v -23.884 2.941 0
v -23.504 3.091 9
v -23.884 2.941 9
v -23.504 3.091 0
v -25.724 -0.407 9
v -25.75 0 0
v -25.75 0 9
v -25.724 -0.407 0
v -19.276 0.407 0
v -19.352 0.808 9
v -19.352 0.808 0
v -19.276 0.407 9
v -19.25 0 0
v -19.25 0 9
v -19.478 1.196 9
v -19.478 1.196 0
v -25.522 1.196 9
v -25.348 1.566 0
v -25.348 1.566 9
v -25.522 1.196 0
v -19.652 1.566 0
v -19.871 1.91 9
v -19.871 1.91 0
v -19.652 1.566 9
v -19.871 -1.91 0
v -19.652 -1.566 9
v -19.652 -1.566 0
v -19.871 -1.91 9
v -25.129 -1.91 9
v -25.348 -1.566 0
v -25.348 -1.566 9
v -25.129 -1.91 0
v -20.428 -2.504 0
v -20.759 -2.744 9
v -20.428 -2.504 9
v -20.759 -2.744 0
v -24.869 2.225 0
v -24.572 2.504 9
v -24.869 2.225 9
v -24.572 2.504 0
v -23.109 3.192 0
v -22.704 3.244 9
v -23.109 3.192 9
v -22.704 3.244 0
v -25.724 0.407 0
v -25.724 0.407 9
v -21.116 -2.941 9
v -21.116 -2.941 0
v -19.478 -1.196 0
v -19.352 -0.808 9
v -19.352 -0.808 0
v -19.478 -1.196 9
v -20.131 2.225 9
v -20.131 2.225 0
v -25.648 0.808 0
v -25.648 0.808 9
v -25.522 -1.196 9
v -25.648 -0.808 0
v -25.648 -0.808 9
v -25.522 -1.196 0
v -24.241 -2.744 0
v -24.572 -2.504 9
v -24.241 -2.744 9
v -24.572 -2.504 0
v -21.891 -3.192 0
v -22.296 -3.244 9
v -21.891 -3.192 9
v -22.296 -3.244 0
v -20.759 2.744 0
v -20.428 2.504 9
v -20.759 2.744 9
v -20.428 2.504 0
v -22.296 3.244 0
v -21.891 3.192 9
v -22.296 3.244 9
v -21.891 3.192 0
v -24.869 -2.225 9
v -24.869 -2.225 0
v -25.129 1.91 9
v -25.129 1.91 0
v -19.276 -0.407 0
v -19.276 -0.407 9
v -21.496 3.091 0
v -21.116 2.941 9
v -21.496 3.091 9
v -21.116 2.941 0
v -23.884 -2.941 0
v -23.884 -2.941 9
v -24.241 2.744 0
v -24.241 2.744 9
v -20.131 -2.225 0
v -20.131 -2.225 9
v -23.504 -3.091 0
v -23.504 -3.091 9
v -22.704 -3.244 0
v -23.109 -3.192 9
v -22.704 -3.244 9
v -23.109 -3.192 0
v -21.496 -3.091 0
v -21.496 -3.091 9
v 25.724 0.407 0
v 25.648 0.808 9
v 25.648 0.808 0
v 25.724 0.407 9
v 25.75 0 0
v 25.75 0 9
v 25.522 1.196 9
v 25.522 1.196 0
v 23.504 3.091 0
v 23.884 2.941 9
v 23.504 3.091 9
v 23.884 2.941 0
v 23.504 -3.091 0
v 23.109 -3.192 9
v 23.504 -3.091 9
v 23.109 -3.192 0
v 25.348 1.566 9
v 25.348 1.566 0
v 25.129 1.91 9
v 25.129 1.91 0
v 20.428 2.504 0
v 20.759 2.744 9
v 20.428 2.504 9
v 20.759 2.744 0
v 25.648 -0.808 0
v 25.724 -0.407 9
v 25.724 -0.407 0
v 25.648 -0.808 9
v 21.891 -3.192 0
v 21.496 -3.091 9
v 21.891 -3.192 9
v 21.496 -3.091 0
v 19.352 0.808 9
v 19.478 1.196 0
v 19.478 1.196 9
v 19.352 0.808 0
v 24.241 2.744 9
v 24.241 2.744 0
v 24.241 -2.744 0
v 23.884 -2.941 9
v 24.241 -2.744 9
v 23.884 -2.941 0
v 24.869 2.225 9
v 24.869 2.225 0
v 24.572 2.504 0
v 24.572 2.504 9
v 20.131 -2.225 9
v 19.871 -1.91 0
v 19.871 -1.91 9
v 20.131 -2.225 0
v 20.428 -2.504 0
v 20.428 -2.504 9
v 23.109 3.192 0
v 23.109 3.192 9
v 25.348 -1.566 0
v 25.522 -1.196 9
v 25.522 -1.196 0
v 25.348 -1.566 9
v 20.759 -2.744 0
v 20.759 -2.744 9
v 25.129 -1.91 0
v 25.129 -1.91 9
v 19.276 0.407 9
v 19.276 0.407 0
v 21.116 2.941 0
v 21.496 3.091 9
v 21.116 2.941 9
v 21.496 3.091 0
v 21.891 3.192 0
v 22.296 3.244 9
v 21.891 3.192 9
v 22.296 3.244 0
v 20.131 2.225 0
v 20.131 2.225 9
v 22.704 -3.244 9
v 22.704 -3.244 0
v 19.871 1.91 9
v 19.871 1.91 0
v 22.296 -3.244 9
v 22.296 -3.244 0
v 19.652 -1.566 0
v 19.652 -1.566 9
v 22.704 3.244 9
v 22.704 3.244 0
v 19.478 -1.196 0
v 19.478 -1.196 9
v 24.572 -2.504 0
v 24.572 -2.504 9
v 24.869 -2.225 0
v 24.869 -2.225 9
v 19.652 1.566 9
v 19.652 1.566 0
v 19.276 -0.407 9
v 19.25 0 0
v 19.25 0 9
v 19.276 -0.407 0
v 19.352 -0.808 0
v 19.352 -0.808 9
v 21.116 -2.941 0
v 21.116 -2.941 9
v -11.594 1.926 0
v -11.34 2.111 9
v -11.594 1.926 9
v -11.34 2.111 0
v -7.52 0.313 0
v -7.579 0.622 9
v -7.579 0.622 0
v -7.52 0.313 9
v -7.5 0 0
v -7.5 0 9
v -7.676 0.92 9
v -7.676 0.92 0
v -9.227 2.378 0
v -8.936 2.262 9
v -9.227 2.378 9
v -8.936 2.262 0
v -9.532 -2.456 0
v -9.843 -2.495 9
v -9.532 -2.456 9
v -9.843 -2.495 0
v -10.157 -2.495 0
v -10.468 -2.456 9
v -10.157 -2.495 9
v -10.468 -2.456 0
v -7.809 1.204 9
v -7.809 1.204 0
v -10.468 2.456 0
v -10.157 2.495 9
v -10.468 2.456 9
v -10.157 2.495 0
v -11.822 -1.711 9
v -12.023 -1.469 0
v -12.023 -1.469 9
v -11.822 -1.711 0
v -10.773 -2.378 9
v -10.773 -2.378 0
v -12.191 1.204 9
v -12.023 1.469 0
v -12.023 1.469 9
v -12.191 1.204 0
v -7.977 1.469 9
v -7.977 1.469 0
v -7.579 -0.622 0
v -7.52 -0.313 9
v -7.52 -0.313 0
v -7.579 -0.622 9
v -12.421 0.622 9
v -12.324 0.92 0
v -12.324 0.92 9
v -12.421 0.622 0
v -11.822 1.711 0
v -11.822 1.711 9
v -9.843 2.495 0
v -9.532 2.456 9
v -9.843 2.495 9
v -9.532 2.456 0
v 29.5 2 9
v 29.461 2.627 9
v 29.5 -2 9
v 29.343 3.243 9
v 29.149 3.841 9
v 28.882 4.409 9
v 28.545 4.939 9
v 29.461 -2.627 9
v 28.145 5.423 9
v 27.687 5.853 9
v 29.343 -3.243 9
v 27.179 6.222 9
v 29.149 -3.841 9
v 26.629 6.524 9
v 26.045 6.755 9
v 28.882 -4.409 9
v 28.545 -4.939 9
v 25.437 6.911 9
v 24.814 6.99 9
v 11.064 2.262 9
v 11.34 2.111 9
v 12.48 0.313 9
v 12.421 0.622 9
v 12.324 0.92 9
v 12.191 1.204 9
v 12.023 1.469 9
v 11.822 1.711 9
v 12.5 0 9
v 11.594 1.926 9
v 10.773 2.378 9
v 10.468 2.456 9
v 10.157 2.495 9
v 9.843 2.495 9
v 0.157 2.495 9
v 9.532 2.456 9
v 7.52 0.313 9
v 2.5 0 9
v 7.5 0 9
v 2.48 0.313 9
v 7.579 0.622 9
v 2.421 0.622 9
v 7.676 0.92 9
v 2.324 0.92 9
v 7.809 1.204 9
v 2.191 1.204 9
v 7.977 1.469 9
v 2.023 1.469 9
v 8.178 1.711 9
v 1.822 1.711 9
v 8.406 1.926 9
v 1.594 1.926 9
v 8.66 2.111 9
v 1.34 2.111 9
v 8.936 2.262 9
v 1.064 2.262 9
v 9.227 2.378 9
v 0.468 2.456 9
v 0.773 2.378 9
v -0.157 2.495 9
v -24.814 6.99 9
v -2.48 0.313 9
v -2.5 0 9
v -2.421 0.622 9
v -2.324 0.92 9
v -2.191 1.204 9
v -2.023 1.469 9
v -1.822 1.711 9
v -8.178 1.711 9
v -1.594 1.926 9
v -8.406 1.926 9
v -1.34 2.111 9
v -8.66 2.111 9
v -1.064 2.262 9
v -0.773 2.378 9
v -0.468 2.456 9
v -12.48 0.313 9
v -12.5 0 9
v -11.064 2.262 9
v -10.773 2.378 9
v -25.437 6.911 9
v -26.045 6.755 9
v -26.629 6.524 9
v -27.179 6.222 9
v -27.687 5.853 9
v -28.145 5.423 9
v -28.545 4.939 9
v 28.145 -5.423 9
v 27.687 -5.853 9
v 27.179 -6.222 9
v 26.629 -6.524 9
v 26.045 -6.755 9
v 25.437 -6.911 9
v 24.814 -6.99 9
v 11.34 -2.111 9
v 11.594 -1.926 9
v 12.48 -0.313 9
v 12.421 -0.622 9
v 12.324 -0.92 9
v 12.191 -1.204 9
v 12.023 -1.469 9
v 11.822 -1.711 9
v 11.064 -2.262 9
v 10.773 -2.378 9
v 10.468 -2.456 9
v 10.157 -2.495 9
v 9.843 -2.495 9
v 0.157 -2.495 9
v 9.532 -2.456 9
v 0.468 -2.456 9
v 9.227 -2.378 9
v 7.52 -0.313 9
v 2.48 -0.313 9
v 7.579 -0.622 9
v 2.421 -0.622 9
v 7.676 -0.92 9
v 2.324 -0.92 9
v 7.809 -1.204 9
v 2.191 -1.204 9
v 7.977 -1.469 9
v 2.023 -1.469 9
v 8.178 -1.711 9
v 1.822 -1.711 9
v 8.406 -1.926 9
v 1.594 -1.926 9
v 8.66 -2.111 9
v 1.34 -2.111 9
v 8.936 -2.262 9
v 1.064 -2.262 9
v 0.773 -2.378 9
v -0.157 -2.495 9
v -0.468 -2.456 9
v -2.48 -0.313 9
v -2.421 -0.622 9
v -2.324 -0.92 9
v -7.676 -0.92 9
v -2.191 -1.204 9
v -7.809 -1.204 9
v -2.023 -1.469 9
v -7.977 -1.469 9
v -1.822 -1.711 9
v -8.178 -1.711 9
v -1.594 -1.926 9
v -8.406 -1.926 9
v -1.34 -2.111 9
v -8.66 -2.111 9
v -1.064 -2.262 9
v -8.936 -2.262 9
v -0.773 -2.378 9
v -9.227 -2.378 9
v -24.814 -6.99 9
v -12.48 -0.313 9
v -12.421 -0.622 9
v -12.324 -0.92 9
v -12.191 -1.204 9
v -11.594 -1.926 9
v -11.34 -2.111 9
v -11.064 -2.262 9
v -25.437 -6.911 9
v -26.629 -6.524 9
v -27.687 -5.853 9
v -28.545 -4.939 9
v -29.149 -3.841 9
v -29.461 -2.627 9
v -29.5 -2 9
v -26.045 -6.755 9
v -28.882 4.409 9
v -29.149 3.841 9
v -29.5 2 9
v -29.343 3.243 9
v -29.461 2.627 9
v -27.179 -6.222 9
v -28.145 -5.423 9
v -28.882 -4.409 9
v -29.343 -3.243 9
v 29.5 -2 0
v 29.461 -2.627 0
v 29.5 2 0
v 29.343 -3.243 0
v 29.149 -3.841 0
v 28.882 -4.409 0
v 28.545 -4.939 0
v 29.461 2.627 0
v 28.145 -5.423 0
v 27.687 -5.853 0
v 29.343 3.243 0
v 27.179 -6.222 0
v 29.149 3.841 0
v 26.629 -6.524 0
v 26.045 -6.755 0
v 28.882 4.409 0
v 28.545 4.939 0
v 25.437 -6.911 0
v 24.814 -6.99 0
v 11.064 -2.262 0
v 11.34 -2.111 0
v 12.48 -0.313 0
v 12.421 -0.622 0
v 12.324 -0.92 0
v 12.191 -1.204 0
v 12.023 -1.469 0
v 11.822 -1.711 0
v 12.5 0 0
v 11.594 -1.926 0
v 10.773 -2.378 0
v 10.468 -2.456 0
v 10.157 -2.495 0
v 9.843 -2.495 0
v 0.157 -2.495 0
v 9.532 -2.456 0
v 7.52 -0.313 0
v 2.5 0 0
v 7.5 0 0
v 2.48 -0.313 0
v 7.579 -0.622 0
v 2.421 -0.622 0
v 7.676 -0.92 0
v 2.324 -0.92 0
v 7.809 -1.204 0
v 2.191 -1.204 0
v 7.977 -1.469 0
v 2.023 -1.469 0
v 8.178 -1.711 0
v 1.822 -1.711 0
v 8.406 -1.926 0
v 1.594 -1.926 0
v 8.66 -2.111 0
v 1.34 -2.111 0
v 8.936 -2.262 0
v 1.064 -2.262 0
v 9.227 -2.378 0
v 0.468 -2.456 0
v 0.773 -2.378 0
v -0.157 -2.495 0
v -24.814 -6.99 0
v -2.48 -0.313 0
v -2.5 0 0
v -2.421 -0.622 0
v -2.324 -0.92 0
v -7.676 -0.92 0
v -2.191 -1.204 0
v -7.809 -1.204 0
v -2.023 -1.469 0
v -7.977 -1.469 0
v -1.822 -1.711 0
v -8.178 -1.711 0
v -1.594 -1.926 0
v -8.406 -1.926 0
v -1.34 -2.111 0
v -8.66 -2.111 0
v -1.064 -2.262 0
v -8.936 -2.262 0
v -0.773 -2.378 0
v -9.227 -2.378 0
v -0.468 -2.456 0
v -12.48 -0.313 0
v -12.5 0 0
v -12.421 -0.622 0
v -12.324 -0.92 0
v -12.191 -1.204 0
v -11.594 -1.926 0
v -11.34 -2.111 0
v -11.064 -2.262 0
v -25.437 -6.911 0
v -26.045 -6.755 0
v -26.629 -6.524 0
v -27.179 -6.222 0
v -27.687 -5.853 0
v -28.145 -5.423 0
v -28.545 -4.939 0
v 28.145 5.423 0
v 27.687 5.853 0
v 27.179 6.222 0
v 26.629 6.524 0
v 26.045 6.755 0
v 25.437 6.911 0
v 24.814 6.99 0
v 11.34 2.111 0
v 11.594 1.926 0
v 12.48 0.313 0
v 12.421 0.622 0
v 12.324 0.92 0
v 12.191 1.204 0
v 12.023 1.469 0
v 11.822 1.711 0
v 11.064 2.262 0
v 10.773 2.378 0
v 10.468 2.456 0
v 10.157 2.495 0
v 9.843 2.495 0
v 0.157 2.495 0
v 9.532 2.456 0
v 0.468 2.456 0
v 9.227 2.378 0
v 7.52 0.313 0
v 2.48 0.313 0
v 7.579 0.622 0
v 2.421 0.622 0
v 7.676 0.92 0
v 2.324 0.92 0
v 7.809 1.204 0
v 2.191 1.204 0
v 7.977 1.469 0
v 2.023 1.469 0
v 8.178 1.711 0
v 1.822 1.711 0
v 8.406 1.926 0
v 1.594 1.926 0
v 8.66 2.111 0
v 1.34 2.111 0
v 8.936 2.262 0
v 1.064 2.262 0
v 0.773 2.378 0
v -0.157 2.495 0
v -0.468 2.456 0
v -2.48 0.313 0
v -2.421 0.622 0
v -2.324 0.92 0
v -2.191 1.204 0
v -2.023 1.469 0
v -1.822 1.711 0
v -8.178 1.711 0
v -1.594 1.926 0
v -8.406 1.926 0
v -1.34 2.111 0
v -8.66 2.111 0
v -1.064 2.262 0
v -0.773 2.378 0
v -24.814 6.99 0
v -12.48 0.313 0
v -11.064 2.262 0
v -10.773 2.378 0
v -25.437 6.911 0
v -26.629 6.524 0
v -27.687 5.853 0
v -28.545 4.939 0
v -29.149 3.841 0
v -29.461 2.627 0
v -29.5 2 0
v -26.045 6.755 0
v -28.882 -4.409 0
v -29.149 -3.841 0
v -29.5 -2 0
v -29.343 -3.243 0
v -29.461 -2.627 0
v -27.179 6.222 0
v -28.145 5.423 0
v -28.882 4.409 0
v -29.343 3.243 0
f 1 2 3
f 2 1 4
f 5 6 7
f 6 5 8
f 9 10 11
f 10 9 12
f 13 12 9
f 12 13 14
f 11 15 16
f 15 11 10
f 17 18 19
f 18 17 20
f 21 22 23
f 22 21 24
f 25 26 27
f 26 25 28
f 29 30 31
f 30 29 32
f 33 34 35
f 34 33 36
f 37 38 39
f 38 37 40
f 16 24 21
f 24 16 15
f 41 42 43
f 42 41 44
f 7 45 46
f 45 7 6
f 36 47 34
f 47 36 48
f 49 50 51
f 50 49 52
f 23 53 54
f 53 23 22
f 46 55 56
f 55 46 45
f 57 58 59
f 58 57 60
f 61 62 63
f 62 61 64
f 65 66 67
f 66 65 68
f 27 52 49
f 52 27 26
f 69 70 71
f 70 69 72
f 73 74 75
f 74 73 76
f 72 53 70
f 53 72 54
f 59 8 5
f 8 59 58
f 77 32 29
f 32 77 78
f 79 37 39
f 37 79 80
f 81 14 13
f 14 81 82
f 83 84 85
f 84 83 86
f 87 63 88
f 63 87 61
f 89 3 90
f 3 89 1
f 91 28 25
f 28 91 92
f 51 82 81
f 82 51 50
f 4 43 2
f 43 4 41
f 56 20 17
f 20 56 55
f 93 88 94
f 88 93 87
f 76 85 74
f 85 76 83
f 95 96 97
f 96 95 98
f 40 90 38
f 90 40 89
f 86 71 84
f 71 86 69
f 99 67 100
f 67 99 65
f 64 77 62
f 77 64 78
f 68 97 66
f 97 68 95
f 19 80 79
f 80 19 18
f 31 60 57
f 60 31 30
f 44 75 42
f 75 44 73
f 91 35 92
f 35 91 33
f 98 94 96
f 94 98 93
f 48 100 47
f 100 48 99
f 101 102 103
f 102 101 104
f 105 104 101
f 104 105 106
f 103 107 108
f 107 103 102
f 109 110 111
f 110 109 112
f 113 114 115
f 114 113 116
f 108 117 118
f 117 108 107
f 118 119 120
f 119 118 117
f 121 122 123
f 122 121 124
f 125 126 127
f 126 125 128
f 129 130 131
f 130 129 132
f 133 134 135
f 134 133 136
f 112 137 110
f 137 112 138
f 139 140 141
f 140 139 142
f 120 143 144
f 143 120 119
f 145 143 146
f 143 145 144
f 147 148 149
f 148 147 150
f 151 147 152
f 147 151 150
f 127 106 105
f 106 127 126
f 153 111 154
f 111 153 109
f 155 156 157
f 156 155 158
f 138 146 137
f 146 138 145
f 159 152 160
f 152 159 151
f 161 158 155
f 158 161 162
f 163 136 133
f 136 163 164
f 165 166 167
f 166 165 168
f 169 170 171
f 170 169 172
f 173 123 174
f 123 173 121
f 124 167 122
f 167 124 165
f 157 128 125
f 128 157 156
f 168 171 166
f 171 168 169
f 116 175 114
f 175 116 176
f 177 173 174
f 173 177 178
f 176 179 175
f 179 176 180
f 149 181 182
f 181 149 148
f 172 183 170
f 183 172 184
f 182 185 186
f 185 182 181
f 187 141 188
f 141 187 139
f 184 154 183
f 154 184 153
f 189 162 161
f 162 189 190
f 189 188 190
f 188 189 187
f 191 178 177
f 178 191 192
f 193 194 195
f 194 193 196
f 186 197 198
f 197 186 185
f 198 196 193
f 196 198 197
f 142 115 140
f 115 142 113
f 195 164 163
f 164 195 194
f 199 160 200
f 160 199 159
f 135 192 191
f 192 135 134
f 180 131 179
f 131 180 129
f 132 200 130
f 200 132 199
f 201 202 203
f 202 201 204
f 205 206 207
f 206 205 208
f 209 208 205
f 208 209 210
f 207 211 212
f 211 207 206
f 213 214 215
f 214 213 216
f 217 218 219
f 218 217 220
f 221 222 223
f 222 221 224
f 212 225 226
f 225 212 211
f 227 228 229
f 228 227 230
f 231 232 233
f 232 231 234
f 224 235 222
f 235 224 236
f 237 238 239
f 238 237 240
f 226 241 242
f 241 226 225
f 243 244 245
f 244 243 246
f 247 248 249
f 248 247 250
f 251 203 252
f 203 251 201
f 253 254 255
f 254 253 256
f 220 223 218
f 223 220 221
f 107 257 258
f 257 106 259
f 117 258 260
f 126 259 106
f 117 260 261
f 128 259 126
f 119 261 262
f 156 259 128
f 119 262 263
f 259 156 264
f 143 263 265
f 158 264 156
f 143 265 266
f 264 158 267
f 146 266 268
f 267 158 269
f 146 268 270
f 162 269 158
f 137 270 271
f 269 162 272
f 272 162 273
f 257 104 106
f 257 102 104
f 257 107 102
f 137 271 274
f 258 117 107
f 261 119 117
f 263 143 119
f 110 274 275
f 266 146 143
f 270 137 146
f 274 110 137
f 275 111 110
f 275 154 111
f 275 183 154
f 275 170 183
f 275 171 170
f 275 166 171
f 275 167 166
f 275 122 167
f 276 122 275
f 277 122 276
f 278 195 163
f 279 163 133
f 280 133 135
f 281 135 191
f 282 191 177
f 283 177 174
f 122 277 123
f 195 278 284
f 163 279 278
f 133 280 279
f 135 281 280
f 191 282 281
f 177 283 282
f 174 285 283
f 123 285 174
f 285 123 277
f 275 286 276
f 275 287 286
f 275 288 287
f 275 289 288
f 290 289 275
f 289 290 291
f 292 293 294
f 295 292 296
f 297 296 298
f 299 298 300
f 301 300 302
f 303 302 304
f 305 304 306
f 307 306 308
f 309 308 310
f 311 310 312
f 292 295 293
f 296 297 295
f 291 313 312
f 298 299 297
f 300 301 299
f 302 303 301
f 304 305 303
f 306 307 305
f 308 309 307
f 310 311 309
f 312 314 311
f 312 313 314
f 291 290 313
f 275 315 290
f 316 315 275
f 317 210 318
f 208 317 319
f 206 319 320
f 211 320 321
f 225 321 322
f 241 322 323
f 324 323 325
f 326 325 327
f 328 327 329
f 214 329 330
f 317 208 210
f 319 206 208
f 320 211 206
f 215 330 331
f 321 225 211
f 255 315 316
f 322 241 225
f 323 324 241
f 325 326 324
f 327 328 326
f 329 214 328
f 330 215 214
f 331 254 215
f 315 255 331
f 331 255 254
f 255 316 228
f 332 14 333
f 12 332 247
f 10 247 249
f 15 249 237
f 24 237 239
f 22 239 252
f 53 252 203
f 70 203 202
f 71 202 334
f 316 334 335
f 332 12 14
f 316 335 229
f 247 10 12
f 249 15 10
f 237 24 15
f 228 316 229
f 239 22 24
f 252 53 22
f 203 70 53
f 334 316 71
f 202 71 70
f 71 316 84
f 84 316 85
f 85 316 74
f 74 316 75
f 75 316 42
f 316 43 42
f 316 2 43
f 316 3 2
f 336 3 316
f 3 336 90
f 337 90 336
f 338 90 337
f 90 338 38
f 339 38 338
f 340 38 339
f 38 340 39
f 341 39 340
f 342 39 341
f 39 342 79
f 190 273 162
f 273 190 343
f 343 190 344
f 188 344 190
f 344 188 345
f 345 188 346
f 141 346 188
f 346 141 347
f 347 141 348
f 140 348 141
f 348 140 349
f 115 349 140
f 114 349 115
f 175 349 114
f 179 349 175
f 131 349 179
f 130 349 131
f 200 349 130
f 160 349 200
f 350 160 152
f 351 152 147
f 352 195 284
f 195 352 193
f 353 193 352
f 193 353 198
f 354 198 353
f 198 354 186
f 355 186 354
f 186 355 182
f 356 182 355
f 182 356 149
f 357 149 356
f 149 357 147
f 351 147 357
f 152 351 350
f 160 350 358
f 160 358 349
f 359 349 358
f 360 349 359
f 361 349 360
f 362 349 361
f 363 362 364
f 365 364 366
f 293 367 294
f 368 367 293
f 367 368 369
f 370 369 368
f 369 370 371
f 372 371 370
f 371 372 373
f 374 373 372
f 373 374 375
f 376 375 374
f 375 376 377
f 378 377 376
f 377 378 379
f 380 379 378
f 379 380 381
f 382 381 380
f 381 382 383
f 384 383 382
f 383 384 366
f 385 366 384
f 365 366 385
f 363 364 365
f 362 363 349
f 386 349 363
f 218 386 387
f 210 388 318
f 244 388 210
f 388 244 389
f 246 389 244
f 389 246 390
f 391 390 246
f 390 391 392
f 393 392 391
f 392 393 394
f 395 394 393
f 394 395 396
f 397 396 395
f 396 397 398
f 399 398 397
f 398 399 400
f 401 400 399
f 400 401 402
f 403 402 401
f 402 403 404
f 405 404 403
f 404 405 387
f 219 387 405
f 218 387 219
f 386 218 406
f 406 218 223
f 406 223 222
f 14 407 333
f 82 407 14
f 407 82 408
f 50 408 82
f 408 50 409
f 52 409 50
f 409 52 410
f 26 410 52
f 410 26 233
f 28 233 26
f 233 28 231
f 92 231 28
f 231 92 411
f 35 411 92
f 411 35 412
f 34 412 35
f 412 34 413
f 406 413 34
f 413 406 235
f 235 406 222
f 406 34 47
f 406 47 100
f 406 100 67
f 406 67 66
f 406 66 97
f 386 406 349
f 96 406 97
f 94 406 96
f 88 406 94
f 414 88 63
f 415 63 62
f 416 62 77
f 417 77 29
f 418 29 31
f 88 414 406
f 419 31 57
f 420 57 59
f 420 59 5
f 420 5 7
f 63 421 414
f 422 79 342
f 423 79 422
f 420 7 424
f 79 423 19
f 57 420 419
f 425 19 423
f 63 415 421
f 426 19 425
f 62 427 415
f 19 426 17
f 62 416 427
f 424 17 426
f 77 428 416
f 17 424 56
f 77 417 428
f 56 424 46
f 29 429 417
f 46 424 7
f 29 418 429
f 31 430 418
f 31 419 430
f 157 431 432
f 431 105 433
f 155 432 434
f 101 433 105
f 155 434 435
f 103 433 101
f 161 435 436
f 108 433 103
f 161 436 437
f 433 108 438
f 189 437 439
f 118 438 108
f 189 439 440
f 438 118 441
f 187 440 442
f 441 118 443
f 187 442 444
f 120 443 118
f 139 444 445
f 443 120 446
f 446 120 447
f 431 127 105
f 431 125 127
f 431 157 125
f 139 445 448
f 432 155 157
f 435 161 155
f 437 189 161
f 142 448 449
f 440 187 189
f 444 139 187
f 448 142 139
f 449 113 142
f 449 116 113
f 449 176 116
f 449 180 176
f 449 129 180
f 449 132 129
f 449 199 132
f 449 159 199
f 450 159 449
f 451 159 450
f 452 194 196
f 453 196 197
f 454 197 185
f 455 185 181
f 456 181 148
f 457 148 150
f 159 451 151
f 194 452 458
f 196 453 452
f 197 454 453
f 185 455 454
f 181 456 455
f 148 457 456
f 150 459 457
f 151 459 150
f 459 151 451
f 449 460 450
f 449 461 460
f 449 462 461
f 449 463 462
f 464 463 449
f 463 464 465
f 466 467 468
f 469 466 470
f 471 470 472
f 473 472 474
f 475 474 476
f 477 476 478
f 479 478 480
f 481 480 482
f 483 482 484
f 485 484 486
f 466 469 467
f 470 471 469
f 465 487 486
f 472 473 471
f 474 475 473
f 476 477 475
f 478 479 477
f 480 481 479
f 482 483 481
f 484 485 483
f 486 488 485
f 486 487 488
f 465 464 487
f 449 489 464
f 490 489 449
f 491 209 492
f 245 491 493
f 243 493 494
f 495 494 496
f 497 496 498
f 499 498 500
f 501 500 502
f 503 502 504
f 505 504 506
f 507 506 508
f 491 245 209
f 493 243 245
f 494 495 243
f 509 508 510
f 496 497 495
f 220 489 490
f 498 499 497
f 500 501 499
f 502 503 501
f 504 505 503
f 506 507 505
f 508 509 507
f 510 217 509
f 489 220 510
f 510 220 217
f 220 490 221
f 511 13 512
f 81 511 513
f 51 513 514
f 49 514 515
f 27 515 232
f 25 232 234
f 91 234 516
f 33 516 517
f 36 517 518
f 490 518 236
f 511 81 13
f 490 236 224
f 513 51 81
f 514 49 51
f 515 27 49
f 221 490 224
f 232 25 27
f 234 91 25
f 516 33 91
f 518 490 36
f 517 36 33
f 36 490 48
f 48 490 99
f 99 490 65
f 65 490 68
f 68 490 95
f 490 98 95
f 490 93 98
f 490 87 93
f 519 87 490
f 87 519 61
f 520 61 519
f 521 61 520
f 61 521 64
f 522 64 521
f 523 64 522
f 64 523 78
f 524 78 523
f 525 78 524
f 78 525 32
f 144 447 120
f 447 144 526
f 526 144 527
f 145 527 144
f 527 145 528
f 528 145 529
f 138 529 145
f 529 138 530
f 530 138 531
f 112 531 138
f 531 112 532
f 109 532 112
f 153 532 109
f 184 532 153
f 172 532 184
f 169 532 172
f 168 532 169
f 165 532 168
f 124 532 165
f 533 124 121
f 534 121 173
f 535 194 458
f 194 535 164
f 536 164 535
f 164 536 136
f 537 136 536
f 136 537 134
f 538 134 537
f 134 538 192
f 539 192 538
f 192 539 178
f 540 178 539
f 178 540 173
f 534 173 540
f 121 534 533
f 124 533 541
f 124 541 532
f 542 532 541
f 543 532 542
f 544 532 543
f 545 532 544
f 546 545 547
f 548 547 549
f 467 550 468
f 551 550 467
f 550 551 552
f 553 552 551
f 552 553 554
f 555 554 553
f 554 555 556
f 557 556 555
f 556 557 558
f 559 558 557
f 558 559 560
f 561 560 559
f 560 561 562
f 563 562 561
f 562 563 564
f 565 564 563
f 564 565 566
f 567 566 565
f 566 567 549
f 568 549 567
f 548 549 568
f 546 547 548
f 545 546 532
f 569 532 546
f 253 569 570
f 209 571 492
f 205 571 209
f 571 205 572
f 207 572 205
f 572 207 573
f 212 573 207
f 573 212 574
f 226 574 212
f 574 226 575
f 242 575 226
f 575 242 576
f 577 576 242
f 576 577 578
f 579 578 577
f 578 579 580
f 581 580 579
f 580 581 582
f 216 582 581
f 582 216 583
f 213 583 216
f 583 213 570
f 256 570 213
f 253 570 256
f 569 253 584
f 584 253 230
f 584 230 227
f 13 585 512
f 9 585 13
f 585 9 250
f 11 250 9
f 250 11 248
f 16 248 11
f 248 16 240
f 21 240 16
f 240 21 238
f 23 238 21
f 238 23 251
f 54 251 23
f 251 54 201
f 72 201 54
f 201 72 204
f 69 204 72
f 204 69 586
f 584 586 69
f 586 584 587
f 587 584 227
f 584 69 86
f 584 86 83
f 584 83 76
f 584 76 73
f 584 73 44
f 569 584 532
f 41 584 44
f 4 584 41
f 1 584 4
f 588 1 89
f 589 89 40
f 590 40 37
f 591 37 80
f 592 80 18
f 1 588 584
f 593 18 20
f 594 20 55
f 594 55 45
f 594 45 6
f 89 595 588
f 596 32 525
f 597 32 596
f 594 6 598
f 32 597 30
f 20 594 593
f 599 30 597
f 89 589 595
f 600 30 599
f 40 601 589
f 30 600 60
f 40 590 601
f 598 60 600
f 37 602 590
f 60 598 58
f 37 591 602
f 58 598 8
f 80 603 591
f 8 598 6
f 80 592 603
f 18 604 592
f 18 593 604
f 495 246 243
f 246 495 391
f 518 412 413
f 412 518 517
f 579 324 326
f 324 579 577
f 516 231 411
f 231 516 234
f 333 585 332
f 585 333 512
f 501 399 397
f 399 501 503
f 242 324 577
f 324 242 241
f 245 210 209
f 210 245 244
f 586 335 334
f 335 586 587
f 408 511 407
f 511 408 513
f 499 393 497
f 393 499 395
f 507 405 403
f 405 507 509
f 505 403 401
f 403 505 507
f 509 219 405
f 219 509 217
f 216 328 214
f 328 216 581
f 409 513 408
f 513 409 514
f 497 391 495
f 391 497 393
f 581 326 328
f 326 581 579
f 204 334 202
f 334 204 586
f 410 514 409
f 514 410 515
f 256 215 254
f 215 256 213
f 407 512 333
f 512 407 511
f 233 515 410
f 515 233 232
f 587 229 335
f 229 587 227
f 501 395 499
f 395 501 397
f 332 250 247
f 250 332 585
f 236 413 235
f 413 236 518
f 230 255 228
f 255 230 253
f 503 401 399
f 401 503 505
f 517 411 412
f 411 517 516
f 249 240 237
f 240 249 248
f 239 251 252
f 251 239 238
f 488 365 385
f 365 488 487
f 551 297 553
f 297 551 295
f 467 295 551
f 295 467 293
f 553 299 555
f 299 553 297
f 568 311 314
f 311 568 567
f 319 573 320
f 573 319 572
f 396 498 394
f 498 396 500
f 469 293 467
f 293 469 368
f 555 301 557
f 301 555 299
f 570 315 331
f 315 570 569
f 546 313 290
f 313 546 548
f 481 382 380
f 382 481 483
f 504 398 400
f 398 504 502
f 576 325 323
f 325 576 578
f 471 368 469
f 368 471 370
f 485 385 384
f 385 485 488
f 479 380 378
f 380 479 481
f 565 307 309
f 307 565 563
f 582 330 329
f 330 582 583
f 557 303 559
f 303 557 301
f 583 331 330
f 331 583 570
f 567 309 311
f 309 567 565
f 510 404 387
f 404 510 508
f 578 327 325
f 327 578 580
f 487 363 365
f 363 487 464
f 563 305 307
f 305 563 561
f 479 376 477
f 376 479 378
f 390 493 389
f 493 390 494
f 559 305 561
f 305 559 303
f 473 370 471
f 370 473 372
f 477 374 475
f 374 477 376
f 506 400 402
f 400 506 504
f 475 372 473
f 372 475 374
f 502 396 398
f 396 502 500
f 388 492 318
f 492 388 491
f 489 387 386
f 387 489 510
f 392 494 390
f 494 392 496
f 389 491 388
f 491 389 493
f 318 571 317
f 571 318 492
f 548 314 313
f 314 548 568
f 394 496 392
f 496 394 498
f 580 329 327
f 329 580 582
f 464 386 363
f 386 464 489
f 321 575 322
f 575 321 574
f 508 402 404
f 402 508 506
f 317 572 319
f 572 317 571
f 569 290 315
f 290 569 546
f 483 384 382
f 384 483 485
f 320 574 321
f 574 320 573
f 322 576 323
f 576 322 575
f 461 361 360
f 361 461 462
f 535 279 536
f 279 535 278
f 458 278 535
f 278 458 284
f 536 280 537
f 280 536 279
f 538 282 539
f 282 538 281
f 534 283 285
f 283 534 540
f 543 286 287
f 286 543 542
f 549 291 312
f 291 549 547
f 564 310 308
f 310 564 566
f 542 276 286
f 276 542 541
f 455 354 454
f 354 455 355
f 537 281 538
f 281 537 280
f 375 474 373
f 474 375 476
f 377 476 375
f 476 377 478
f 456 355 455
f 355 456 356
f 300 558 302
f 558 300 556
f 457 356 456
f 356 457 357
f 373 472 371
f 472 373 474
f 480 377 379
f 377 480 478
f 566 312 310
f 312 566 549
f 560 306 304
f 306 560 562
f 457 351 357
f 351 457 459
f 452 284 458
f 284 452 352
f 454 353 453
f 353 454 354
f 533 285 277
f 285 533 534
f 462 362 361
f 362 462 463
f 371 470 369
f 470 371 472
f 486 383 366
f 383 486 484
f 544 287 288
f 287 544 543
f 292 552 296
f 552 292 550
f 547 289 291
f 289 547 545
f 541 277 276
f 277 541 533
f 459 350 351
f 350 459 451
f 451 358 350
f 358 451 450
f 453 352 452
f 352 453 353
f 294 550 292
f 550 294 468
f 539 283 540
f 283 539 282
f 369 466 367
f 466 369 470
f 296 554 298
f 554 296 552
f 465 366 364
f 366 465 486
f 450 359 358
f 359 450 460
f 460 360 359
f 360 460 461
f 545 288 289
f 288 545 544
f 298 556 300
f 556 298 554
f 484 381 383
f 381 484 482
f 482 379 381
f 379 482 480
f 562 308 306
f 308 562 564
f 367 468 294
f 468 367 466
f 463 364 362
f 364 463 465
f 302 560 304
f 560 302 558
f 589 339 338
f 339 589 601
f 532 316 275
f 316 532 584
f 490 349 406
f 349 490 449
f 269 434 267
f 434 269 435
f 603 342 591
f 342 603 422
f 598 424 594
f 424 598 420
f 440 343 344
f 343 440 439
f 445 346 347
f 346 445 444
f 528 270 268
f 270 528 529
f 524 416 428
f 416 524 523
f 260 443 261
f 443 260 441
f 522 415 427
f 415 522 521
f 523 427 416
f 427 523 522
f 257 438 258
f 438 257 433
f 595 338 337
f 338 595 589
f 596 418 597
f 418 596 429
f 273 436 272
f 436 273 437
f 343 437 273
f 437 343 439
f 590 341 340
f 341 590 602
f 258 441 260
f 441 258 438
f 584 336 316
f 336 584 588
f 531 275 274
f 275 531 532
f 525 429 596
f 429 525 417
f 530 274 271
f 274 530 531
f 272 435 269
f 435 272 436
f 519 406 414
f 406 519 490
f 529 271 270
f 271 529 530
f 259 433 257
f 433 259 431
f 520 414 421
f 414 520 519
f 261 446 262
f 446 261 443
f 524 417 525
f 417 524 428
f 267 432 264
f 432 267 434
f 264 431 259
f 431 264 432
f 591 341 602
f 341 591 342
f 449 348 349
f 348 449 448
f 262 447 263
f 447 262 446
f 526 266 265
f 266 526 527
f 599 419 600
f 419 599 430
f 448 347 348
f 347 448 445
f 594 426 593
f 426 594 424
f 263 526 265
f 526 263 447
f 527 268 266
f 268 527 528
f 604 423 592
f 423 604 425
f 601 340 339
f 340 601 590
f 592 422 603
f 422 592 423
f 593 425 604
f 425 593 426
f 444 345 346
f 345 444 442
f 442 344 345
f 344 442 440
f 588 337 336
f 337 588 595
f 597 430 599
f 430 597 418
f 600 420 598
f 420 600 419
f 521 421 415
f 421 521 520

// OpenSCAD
$fn = 50;


difference() {
	union() {
		hull() {
			translate(v = [-24.5000000000, 2.0000000000, 0]) {
				cylinder(h = 9, r = 5);
			}
			translate(v = [24.5000000000, 2.0000000000, 0]) {
				cylinder(h = 9, r = 5);
			}
			translate(v = [-24.5000000000, -2.0000000000, 0]) {
				cylinder(h = 9, r = 5);
			}
			translate(v = [24.5000000000, -2.0000000000, 0]) {
				cylinder(h = 9, r = 5);
			}
		}
	}
	union() {
		#translate(v = [-22.5000000000, 0.0000000000, 0]) {
			cylinder(h = 9, r = 3.2500000000);
		}
		#translate(v = [22.5000000000, 0.0000000000, 0]) {
			cylinder(h = 9, r = 3.2500000000);
		}
		#translate(v = [-22.5000000000, 0.0000000000, -100.0000000000]) {
			cylinder(h = 200, r = 3.2500000000);
		}
		#translate(v = [-22.5000000000, 0.0000000000, -100.0000000000]) {
			cylinder(h = 200, r = 3.2500000000);
		}
		#translate(v = [22.5000000000, 0.0000000000, -100.0000000000]) {
			cylinder(h = 200, r = 3.2500000000);
		}
		#translate(v = [22.5000000000, 0.0000000000, -100.0000000000]) {
			cylinder(h = 200, r = 3.2500000000);
		}
		#translate(v = [-22.5000000000, 0.0000000000, 0]) {
			cylinder(h = 9, r = 1.8000000000);
		}
		#translate(v = [22.5000000000, 0.0000000000, 0]) {
			cylinder(h = 9, r = 1.8000000000);
		}
		#translate(v = [-22.5000000000, 0.0000000000, 0]) {
			cylinder(h = 9, r = 1.8000000000);
		}
		#translate(v = [22.5000000000, 0.0000000000, 0]) {
			cylinder(h = 9, r = 1.8000000000);
		}
		#translate(v = [-22.5000000000, 0.0000000000, 0]) {
			cylinder(h = 9, r = 1.8000000000);
		}
		#translate(v = [22.5000000000, 0.0000000000, 0]) {
			cylinder(h = 9, r = 1.8000000000);
		}
		#translate(v = [-10.0000000000, 0, 0]) {
			cylinder(h = 9, r = 2.5000000000);
		}
		#cylinder(h = 9, r = 2.5000000000);
		#translate(v = [10.0000000000, 0, 0]) {
			cylinder(h = 9, r = 2.5000000000);
		}
	}
}
